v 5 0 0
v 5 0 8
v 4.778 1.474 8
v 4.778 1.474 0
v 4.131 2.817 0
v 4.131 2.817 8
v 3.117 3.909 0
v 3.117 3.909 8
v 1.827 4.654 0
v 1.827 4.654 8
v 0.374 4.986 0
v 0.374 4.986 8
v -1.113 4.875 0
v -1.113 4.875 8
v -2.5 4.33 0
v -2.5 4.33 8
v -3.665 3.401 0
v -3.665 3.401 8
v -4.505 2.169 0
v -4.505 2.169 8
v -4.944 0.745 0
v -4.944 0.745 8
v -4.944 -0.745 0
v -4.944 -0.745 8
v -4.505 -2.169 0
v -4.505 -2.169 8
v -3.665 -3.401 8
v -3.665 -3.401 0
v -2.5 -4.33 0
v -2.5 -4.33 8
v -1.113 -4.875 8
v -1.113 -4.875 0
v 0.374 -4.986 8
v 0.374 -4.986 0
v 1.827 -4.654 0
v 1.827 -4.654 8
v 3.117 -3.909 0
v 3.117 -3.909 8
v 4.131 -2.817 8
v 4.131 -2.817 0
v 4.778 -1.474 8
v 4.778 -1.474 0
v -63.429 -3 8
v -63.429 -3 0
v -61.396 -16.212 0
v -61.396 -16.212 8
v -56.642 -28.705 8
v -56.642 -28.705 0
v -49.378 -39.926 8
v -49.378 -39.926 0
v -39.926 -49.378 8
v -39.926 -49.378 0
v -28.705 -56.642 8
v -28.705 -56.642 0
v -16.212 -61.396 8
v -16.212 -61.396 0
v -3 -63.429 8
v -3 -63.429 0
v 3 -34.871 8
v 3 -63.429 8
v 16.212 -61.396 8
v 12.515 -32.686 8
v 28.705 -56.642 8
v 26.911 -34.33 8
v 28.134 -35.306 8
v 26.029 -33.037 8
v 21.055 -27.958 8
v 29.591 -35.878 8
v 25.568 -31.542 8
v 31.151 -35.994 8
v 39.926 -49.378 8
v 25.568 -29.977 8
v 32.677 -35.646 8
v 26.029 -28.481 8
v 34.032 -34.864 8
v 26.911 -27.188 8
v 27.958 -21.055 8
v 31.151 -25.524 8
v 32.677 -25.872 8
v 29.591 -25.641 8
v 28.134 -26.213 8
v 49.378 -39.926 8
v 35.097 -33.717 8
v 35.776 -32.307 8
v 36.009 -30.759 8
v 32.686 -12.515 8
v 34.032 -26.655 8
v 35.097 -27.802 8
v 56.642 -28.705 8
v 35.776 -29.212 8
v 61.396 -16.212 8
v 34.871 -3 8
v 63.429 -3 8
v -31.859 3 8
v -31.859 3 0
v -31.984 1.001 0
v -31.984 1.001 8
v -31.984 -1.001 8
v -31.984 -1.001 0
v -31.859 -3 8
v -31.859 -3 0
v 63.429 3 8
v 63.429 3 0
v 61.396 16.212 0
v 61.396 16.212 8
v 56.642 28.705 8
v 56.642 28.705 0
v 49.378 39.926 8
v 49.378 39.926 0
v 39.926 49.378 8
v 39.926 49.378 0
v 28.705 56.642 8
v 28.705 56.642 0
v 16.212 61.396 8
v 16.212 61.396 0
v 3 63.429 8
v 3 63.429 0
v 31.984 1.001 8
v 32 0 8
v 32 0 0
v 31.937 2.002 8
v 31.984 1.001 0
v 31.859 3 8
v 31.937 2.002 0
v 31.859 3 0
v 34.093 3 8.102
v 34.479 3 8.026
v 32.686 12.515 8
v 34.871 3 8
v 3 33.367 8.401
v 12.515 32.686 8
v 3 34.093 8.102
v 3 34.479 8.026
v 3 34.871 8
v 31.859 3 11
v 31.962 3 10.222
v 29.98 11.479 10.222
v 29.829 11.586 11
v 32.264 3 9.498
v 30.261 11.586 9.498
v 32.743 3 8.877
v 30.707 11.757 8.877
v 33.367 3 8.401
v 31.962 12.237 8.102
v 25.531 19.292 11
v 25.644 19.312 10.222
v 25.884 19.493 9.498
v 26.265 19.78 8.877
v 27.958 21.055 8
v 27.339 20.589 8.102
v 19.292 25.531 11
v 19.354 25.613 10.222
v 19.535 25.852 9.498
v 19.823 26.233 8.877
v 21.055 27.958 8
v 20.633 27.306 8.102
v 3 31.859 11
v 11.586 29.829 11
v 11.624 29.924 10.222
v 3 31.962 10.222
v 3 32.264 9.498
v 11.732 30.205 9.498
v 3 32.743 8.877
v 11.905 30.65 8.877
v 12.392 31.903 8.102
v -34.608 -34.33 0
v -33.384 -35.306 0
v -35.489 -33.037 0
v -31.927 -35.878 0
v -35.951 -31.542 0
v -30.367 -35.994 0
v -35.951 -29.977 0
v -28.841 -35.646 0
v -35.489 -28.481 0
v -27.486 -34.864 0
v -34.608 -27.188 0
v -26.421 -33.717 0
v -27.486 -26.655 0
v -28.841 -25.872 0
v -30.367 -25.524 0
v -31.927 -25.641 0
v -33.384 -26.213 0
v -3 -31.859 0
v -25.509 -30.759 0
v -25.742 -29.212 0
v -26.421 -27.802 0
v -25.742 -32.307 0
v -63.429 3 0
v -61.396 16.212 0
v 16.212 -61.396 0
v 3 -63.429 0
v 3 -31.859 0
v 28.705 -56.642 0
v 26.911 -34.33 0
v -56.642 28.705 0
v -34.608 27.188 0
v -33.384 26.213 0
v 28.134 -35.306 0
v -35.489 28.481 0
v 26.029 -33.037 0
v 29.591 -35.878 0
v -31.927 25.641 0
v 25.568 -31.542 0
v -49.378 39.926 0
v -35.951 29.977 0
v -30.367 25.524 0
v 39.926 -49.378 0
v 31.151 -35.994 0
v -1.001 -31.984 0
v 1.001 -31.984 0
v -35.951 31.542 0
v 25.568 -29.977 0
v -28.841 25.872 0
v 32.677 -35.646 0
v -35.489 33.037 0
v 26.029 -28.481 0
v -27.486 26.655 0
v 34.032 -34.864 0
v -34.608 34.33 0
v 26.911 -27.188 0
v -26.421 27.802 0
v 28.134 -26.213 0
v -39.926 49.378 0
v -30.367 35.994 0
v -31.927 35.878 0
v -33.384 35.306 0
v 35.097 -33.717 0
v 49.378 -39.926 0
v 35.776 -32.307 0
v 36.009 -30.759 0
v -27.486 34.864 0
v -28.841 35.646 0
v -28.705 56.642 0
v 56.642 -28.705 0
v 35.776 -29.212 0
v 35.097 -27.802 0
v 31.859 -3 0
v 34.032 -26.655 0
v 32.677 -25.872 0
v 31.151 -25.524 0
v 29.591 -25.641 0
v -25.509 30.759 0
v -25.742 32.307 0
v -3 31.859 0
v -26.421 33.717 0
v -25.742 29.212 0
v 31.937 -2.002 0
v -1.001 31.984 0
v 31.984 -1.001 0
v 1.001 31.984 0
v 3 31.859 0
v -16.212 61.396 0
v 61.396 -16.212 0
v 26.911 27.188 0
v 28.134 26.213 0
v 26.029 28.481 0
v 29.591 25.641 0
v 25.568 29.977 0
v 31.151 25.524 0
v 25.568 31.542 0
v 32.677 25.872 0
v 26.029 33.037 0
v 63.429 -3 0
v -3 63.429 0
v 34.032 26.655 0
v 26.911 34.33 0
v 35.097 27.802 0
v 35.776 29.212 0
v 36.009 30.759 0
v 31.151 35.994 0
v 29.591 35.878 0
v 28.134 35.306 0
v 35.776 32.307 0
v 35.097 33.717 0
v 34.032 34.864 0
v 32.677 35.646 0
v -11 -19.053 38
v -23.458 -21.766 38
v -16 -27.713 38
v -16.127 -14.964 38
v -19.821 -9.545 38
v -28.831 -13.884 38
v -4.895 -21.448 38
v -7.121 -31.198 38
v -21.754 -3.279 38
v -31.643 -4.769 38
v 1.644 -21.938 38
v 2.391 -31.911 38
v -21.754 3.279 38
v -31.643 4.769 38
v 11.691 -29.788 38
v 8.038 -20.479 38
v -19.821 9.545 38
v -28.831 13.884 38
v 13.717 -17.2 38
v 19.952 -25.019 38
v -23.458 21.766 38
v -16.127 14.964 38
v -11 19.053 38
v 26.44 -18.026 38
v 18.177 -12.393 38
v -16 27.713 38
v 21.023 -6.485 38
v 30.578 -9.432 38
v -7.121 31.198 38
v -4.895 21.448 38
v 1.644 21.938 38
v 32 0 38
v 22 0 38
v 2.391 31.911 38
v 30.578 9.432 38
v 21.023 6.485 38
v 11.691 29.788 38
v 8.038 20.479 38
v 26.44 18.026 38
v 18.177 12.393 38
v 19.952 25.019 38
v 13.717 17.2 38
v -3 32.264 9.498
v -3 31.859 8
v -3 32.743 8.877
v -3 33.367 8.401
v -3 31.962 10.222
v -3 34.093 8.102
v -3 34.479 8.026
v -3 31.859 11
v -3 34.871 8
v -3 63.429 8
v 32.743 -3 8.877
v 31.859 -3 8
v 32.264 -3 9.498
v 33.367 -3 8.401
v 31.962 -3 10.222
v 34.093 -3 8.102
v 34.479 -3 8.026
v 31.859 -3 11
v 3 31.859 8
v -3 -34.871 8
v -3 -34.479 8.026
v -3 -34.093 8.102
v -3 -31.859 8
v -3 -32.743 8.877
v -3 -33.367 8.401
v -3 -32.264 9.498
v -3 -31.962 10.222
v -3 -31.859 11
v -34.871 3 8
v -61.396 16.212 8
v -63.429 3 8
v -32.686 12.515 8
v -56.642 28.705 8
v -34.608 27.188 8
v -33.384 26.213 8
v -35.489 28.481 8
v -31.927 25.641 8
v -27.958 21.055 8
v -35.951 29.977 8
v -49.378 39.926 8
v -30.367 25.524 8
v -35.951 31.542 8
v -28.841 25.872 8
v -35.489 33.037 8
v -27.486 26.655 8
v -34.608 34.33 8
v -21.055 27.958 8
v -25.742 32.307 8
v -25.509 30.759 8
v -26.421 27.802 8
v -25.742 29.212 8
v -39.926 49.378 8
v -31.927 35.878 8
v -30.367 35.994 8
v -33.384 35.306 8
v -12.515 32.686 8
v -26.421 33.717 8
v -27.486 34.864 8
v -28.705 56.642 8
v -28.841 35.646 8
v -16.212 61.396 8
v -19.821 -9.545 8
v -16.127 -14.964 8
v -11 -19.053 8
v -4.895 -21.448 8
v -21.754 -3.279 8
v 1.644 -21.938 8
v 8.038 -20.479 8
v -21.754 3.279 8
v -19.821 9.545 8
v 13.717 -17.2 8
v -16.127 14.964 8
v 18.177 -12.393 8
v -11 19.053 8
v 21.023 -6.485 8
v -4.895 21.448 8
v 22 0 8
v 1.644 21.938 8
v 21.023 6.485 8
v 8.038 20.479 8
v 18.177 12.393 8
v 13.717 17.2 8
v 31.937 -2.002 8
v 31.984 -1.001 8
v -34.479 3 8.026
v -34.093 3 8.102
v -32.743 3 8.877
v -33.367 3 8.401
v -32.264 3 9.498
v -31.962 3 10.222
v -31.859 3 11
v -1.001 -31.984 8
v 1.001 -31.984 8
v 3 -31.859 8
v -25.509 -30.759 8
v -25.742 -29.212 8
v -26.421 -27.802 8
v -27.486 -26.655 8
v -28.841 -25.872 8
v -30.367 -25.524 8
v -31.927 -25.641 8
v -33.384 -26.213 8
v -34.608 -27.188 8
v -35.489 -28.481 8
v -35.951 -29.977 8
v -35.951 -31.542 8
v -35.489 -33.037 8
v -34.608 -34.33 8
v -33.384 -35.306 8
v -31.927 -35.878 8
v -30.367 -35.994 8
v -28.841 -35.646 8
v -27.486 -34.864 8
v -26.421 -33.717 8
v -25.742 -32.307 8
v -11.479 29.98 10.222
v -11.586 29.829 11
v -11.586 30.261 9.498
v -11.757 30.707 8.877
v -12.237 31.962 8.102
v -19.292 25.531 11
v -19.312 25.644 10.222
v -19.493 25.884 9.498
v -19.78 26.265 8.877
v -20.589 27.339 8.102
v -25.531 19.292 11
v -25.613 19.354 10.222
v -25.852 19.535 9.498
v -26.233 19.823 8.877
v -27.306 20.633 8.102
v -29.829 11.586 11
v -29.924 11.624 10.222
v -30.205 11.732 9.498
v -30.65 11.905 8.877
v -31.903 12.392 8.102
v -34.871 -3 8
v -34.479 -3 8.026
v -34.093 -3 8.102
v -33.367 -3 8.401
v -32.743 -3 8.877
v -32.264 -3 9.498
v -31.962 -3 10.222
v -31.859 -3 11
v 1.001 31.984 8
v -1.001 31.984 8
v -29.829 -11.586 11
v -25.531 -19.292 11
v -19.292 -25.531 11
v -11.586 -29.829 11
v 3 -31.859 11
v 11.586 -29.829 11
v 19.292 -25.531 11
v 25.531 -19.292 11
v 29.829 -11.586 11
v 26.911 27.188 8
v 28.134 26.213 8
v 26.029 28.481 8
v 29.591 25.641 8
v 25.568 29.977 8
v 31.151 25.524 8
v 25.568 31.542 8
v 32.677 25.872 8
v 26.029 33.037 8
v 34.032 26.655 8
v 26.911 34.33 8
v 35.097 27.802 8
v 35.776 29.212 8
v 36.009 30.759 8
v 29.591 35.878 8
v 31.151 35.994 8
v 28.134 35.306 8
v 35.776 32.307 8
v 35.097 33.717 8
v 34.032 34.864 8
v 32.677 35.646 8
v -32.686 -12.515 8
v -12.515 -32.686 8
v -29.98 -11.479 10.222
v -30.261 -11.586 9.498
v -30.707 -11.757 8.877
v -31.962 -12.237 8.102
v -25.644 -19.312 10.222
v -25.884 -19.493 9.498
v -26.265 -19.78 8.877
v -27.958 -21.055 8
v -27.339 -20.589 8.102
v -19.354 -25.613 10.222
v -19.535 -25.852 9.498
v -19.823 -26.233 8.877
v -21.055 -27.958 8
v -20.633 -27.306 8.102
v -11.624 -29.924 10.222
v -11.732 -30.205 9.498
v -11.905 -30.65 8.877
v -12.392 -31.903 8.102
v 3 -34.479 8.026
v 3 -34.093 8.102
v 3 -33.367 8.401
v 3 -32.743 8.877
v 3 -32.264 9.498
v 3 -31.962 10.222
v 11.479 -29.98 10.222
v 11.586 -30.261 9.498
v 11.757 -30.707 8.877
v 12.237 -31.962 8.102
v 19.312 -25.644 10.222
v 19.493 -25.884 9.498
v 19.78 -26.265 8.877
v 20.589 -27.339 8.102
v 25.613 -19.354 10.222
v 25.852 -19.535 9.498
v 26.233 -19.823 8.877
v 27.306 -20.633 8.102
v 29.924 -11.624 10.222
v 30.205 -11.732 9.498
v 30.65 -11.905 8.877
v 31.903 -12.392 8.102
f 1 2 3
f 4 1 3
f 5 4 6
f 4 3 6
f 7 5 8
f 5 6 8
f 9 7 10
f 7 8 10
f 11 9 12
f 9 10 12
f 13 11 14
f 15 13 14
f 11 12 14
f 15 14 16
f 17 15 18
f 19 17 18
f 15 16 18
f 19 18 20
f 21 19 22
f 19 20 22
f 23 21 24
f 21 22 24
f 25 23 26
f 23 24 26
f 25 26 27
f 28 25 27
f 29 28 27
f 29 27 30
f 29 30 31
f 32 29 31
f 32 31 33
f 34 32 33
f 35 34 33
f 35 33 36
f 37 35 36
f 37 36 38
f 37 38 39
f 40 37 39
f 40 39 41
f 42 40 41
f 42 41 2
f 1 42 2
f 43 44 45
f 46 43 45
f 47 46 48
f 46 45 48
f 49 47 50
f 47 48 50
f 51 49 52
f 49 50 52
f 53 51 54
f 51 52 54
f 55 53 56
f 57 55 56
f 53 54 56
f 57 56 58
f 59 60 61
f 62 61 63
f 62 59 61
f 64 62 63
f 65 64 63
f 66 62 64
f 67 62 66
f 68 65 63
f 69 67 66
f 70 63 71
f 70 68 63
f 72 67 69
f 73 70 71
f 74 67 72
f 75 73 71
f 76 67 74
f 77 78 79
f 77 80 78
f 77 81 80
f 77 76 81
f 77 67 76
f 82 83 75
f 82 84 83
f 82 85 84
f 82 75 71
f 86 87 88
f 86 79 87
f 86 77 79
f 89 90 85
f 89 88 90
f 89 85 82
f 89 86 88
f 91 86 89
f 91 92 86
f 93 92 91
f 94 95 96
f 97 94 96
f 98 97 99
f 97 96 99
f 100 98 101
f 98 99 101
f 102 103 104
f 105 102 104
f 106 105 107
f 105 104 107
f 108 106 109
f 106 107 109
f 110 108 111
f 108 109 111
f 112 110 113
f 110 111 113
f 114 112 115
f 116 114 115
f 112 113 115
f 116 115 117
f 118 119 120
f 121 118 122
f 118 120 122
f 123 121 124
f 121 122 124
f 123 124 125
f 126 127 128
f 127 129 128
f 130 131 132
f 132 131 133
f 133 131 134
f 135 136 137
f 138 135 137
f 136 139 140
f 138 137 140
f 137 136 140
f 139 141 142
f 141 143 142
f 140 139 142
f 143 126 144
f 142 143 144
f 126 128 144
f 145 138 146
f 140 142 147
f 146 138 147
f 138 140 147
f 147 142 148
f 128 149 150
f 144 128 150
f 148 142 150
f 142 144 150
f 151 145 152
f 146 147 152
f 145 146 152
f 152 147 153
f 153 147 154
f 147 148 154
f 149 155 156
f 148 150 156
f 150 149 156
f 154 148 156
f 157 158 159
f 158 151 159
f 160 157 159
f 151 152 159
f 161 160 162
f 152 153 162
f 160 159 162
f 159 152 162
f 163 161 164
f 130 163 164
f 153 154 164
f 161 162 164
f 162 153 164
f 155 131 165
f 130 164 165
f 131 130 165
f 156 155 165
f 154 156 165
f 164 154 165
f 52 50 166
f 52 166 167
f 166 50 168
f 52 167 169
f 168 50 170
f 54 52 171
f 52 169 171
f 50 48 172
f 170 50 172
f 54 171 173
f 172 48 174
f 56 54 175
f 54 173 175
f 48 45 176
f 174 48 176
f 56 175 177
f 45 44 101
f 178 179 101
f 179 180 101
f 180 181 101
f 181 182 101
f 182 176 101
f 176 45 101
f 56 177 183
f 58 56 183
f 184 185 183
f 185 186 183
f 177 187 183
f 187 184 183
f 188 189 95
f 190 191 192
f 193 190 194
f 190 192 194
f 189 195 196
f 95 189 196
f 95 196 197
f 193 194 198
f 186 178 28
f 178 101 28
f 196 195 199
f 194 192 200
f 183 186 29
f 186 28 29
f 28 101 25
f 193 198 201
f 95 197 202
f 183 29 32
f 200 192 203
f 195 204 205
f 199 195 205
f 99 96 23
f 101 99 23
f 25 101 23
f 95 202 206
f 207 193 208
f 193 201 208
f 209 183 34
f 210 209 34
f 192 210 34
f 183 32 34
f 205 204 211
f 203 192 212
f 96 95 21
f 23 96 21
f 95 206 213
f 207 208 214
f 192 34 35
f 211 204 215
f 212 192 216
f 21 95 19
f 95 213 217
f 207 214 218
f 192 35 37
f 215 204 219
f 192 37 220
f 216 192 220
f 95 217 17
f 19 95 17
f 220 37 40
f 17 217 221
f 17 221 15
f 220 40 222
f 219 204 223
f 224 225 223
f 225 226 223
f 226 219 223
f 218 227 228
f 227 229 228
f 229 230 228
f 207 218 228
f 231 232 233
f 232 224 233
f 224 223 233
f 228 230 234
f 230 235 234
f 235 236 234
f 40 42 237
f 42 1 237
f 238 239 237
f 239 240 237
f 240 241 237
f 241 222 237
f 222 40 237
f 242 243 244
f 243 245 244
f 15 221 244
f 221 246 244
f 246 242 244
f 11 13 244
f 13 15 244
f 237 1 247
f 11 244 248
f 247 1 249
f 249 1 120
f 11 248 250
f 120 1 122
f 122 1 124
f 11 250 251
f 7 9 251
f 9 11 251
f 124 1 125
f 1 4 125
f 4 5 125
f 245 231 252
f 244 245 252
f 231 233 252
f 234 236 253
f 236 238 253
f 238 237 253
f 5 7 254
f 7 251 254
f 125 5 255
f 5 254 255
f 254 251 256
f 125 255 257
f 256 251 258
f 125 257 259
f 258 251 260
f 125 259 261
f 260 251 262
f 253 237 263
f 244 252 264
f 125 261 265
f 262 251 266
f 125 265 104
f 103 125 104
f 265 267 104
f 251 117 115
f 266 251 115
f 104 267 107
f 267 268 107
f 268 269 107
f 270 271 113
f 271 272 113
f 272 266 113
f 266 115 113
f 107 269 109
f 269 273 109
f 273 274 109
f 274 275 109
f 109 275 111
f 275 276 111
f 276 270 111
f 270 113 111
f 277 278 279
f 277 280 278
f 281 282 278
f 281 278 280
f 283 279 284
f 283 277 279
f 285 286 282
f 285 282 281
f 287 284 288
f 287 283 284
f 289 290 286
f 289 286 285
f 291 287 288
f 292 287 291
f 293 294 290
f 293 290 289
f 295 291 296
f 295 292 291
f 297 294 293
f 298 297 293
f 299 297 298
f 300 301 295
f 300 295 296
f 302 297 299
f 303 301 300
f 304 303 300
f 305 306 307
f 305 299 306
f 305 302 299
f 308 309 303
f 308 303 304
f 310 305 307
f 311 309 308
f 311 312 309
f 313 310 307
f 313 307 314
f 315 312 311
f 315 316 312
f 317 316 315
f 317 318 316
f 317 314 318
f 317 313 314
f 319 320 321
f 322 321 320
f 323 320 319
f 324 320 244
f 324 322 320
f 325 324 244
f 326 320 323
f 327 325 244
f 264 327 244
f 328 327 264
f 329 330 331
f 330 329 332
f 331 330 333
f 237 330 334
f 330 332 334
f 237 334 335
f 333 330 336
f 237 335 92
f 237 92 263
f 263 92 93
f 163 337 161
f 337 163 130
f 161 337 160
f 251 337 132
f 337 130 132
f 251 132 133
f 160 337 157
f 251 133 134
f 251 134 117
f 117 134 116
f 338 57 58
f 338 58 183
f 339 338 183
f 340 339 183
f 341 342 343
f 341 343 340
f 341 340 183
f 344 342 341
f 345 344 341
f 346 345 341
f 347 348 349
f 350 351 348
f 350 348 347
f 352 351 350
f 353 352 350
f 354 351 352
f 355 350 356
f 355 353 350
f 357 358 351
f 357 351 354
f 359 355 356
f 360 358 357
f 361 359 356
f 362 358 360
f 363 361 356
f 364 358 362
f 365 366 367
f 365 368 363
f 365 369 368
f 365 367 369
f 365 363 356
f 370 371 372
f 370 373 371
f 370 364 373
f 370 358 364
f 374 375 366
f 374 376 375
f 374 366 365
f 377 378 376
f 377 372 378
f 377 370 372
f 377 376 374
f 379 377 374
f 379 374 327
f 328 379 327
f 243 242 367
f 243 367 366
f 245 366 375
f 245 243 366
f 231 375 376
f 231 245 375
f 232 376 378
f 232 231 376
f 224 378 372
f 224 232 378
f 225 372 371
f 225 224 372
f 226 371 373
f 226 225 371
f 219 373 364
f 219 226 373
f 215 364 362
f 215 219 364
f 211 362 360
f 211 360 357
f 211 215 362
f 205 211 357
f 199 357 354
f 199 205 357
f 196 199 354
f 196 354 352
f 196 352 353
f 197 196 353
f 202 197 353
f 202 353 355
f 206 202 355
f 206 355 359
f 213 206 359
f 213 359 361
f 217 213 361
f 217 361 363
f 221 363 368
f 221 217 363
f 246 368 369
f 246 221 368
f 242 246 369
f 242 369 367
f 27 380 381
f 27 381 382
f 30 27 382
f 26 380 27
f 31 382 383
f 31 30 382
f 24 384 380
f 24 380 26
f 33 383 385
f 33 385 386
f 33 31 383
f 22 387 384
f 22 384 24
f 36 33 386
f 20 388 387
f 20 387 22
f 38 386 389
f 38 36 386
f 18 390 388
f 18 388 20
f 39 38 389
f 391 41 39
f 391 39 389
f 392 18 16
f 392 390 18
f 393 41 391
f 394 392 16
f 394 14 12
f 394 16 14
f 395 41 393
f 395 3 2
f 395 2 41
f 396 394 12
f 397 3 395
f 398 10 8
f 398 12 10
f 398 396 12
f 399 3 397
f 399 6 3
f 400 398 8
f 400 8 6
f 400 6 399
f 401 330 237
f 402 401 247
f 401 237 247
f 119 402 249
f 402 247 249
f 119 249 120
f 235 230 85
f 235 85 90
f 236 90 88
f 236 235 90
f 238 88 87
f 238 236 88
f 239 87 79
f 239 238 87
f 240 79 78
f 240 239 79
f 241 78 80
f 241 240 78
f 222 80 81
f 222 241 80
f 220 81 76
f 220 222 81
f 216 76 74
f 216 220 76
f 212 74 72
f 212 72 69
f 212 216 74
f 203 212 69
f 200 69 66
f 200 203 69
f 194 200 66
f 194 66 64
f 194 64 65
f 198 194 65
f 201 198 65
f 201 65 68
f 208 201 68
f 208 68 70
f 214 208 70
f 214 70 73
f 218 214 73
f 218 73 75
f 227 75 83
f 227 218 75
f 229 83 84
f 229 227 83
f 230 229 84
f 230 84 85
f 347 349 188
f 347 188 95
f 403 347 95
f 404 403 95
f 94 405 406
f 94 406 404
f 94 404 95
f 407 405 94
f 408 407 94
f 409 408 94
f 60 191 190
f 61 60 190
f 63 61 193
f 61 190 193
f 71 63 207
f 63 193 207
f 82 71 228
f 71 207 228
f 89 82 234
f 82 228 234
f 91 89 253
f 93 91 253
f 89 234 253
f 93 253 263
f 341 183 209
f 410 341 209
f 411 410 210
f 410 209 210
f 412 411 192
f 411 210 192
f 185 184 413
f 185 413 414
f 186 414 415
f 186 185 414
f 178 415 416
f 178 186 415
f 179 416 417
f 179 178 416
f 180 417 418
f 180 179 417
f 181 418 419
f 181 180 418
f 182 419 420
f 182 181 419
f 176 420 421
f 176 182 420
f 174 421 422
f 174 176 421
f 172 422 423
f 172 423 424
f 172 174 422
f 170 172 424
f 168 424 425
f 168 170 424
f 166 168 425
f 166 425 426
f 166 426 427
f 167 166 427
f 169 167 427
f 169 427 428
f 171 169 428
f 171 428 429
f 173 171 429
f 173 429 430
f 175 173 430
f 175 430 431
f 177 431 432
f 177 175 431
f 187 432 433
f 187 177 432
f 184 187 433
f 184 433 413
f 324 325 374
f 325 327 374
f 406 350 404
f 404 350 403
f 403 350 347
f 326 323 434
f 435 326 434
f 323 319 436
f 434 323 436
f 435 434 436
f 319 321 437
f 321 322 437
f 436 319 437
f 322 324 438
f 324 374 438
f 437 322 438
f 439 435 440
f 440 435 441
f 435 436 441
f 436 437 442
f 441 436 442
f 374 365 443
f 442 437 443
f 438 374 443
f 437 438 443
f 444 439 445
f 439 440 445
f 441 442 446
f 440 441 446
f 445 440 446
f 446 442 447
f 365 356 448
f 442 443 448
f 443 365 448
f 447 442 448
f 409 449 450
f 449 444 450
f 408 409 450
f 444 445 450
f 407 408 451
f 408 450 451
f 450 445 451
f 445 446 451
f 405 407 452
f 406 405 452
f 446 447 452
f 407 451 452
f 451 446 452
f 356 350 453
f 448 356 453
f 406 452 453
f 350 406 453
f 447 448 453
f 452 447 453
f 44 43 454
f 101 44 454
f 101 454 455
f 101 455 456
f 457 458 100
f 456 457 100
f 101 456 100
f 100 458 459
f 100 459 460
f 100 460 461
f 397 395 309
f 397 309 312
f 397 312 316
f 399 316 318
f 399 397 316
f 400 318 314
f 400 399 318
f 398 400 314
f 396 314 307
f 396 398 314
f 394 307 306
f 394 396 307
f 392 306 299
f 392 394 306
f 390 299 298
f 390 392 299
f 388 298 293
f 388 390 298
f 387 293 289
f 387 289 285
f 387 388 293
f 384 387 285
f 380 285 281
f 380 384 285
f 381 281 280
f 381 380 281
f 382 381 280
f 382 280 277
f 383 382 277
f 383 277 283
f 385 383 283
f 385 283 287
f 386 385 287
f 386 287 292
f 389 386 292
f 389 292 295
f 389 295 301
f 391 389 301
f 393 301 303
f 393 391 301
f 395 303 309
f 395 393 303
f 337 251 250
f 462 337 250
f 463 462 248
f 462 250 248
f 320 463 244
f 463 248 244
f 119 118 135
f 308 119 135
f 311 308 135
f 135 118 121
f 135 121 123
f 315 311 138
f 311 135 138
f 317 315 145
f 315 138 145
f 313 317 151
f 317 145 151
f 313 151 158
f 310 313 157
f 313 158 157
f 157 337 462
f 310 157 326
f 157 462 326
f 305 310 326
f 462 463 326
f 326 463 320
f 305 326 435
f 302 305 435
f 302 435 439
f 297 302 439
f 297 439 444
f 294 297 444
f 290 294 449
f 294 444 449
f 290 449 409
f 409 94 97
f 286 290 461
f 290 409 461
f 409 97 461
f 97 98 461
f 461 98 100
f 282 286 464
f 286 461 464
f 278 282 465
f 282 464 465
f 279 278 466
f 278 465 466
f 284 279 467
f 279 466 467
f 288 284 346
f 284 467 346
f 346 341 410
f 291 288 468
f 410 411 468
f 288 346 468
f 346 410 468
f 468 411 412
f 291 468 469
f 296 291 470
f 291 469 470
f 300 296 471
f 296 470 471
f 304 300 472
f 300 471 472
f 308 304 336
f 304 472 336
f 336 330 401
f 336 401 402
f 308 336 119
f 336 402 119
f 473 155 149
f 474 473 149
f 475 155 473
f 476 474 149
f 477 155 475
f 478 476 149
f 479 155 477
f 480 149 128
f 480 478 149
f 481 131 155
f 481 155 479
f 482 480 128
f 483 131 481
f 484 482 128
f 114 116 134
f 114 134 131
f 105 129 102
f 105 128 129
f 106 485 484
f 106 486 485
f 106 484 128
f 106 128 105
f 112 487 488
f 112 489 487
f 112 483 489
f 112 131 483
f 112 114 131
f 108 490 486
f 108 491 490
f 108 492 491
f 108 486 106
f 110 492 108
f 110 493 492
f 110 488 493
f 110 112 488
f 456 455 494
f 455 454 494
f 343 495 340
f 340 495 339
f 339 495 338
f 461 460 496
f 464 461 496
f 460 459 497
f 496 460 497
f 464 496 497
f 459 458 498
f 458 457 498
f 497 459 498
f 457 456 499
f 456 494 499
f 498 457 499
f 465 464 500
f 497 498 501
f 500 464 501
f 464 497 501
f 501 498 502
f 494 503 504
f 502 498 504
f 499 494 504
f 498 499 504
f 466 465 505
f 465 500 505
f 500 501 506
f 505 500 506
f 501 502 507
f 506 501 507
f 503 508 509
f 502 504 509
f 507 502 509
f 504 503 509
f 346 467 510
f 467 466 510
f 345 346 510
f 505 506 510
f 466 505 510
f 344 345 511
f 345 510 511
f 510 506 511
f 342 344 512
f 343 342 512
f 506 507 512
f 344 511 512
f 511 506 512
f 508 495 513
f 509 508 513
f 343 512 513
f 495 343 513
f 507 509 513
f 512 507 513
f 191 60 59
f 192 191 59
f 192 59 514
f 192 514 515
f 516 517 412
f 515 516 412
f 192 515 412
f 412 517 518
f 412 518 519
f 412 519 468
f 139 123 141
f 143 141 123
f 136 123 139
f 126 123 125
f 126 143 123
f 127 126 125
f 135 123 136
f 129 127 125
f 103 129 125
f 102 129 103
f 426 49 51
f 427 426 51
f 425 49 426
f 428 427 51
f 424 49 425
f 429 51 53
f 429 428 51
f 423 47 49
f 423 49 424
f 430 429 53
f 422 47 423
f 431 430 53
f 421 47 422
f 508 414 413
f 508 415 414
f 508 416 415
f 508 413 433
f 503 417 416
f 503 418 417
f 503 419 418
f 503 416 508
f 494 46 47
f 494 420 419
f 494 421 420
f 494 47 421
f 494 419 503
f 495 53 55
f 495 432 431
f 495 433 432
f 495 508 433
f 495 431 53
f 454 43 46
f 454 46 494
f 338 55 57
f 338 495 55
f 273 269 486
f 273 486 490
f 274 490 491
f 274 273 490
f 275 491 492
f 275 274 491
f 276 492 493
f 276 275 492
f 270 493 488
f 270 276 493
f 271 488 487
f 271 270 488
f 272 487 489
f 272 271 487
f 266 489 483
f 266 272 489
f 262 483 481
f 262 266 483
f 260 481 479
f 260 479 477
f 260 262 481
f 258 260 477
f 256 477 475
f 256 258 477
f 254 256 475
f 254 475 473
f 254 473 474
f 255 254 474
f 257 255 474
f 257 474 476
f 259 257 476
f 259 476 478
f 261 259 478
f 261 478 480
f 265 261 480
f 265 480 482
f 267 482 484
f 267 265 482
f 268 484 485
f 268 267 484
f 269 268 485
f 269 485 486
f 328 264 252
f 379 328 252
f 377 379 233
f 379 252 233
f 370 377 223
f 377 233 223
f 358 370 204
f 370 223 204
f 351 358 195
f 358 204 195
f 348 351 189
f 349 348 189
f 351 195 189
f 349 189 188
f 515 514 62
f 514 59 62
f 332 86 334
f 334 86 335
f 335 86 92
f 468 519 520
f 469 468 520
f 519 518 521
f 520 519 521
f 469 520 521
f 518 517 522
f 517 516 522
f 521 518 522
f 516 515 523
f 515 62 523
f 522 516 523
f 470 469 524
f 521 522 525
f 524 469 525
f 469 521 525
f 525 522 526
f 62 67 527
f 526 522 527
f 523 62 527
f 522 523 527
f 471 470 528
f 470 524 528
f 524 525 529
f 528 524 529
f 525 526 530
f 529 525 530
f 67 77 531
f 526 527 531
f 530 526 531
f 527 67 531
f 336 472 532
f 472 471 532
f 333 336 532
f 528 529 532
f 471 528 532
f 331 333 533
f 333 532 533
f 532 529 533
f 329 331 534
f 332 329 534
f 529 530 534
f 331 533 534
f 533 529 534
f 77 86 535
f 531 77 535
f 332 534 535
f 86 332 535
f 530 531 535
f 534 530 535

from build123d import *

# Parameters (mm, degrees)
F0_R         = 5.25
F1_DEPTH     = 8
F2_R         = 32
F2_R_2       = 22
F3_DEPTH     = 30
F4_T4_ANGLE  = 106.1070017135
F4_T9_ANGLE  = 106.1070017135
F4_T15_ANGLE = 106.1070017135
F4_T20_ANGLE = 106.1070017135
F4_T25_ANGLE = 106.1070017135
F4_T31_ANGLE = 106.1070017135
F4_T36_ANGLE = 106.1070017135
F4_T41_ANGLE = 106.1070017135
F4_T47_ANGLE = 106.1070017135
F4_T52_ANGLE = 106.1070017135
F4_T57_ANGLE = 106.1070017135
F4_T63_ANGLE = 106.1070017135
F5_R         = 5
F6_DEPTH     = 19.3


# Not quite as in the source:
# - a fillet or chamfer that OpenCascade refuses, or shapes differently, is made with other operations: its cross-section is extruded or revolved along the edge and cut away or added


with BuildPart() as f1:
    # F0 (on Top) → F1 (new body)
    with BuildSketch(Plane.XY):
        with BuildLine():
            ThreePointArc((3, 31.8590646441), (22.627416998, 22.627416998), (31.8590646441, 3))
            Line((31.8590646441, 3), (63.4290942707, 3))
            ThreePointArc((63.4290942707, 3), (44.9012806053, 44.9012806053), (3, 63.4290942707))
            Line((3, 63.4290942707), (3, 31.8590646441))
        make_face()
        with Locations((30.7591449816, 30.7591449816)):
            Circle(F0_R, mode=Mode.SUBTRACT)
        with BuildLine():
            ThreePointArc((-31.8590646441, 3), (-22.627416998, 22.627416998), (-3, 31.8590646441))
            Line((-3, 31.8590646441), (-3, 63.4290942707))
            ThreePointArc((-3, 63.4290942707), (-44.9012806053, 44.9012806053), (-63.4290942707, 3))
            Line((-63.4290942707, 3), (-31.8590646441, 3))
        make_face()
        with Locations((-30.7591449816, 30.7591449816)):
            Circle(F0_R, mode=Mode.SUBTRACT)
        with BuildLine():
            Line((-3, -63.4290942707), (-3, -31.8590646441))
            ThreePointArc((-3, -31.8590646441), (-22.627416998, -22.627416998), (-31.8590646441, -3))
            Line((-31.8590646441, -3), (-63.4290942707, -3))
            ThreePointArc((-63.4290942707, -3), (-44.9012806053, -44.9012806053), (-3, -63.4290942707))
        make_face()
        with Locations((-30.7591449816, -30.7591449816)):
            Circle(F0_R, mode=Mode.SUBTRACT)
        with BuildLine():
            Line((63.4290942707, -3), (31.8590646441, -3))
            ThreePointArc((31.8590646441, -3), (22.627416998, -22.627416998), (3, -31.8590646441))
            Line((3, -31.8590646441), (3, -63.4290942707))
            ThreePointArc((3, -63.4290942707), (44.9012806053, -44.9012806053), (63.4290942707, -3))
        make_face()
        with Locations((30.7591449816, -30.7591449816)):
            Circle(F0_R, mode=Mode.SUBTRACT)
        with BuildLine():
            ThreePointArc((31.8590646441, -3), (31.9647467424, -1.501654319), (32, 0))
            ThreePointArc((32, 0), (31.9647467424, 1.501654319), (31.8590646441, 3))
            ThreePointArc((31.8590646441, 3), (22.627416998, 22.627416998), (3, 31.8590646441))
            ThreePointArc((3, 31.8590646441), (0, 32), (-3, 31.8590646441))
            ThreePointArc((-3, 31.8590646441), (-22.627416998, 22.627416998), (-31.8590646441, 3))
            ThreePointArc((-31.8590646441, 3), (-32, 0), (-31.8590646441, -3))
            ThreePointArc((-31.8590646441, -3), (-22.627416998, -22.627416998), (-3, -31.8590646441))
            ThreePointArc((-3, -31.8590646441), (0, -32), (3, -31.8590646441))
            ThreePointArc((3, -31.8590646441), (22.627416998, -22.627416998), (31.8590646441, -3))
        make_face()
    extrude(amount=F1_DEPTH)

    # F2 (on face) → F3 (join)
    with BuildSketch(Plane.XY.offset(8)):
        Circle(F2_R)
        Circle(F2_R_2, mode=Mode.SUBTRACT)
    extrude(amount=F3_DEPTH)

    # F4: fillet of radius 3 on 6 edges, made by hand


with BuildPart() as f4_tool2:
    # F4_s3 → F4_t4 (revolve)
    with BuildSketch(Plane(origin=(0, 0, 0), x_dir=(0, 0, 1), z_dir=(-0.1400977189, -0.9901376819, 0))):
        with BuildLine():
            ThreePointArc((11, -32), (8.8786796564, -32.8786796564), (8, -35))
            Line((8, -35), (8, -32))
            Line((8, -32), (11, -32))
        make_face()
    revolve(axis=Axis((0, 0, 8), (0, 0, 1)), revolution_arc=F4_T4_ANGLE)

    split(bisect_by=Plane.XZ.offset(3), keep=Keep.TOP)


with BuildPart() as f1_1:
    add(f1.part)

    # F4_t1: union F4_tool2
    add(f4_tool2.part)


with BuildPart() as f4_tool7:
    # F4_s8 → F4_t9 (revolve)
    with BuildSketch(Plane(origin=(0, 0, 0), x_dir=(0, 0, 1), z_dir=(-0.1400977189, -0.9901376819, 0))):
        with BuildLine():
            ThreePointArc((11, -32), (8.8786796564, -32.8786796564), (8, -35))
            Line((8, -35), (8, -32))
            Line((8, -32), (11, -32))
        make_face()
    revolve(axis=Axis((0, 0, 8), (0, 0, 1)), revolution_arc=F4_T9_ANGLE)

    split(bisect_by=Plane.YZ.offset(3), keep=Keep.TOP)

    split(bisect_by=Plane.XZ.offset(-3), keep=Keep.BOTTOM)


with BuildPart() as f1_2:
    add(f1_1.part)

    # F4_t6: union F4_tool7
    add(f4_tool7.part)


with BuildPart() as f4_tool13:
    # F4_s14 → F4_t15 (revolve)
    with BuildSketch(Plane(origin=(0, 0, 0), x_dir=(0, 0, 1), z_dir=(-0.1400977189, -0.9901376819, 0))):
        with BuildLine():
            ThreePointArc((11, -32), (8.8786796564, -32.8786796564), (8, -35))
            Line((8, -35), (8, -32))
            Line((8, -32), (11, -32))
        make_face()
    revolve(axis=Axis((0, 0, 8), (0, 0, 1)), revolution_arc=F4_T15_ANGLE)

    split(bisect_by=Plane.YZ.offset(-3), keep=Keep.BOTTOM)


with BuildPart() as f1_3:
    add(f1_2.part)

    # F4_t12: union F4_tool13
    add(f4_tool13.part)


with BuildPart() as f4_tool18:
    # F4_s19 → F4_t20 (revolve)
    with BuildSketch(Plane(origin=(0, 0, 0), x_dir=(0, 0, 1), z_dir=(-0.9901376819, 0.1400977189, 0))):
        with BuildLine():
            ThreePointArc((11, -32), (8.8786796564, -32.8786796564), (8, -35))
            Line((8, -35), (8, -32))
            Line((8, -32), (11, -32))
        make_face()
    revolve(axis=Axis((0, 0, 8), (0, 0, 1)), revolution_arc=F4_T20_ANGLE)

    split(bisect_by=Plane.YZ.offset(-3), keep=Keep.BOTTOM)


with BuildPart() as f1_4:
    add(f1_3.part)

    # F4_t17: union F4_tool18
    add(f4_tool18.part)


with BuildPart() as f4_tool23:
    # F4_s24 → F4_t25 (revolve)
    with BuildSketch(Plane(origin=(0, 0, 0), x_dir=(0, 0, 1), z_dir=(-0.9901376819, 0.1400977189, 0))):
        with BuildLine():
            ThreePointArc((11, -32), (8.8786796564, -32.8786796564), (8, -35))
            Line((8, -35), (8, -32))
            Line((8, -32), (11, -32))
        make_face()
    revolve(axis=Axis((0, 0, 8), (0, 0, 1)), revolution_arc=F4_T25_ANGLE)

    split(bisect_by=Plane.XZ.offset(3), keep=Keep.TOP)

    split(bisect_by=Plane.YZ.offset(3), keep=Keep.TOP)


with BuildPart() as f1_5:
    add(f1_4.part)

    # F4_t22: union F4_tool23
    add(f4_tool23.part)


with BuildPart() as f4_tool29:
    # F4_s30 → F4_t31 (revolve)
    with BuildSketch(Plane(origin=(0, 0, 0), x_dir=(0, 0, 1), z_dir=(-0.9901376819, 0.1400977189, 0))):
        with BuildLine():
            ThreePointArc((11, -32), (8.8786796564, -32.8786796564), (8, -35))
            Line((8, -35), (8, -32))
            Line((8, -32), (11, -32))
        make_face()
    revolve(axis=Axis((0, 0, 8), (0, 0, 1)), revolution_arc=F4_T31_ANGLE)

    split(bisect_by=Plane.XZ.offset(-3), keep=Keep.BOTTOM)


with BuildPart() as f1_6:
    add(f1_5.part)

    # F4_t28: union F4_tool29
    add(f4_tool29.part)


with BuildPart() as f4_tool34:
    # F4_s35 → F4_t36 (revolve)
    with BuildSketch(Plane(origin=(0, 0, 0), x_dir=(0, 0, 1), z_dir=(0.1400977189, 0.9901376819, 0))):
        with BuildLine():
            ThreePointArc((11, -32), (8.8786796564, -32.8786796564), (8, -35))
            Line((8, -35), (8, -32))
            Line((8, -32), (11, -32))
        make_face()
    revolve(axis=Axis((0, 0, 8), (0, 0, 1)), revolution_arc=F4_T36_ANGLE)

    split(bisect_by=Plane.XZ.offset(-3), keep=Keep.BOTTOM)


with BuildPart() as f1_7:
    add(f1_6.part)

    # F4_t33: union F4_tool34
    add(f4_tool34.part)


with BuildPart() as f4_tool39:
    # F4_s40 → F4_t41 (revolve)
    with BuildSketch(Plane(origin=(0, 0, 0), x_dir=(0, 0, 1), z_dir=(0.1400977189, 0.9901376819, 0))):
        with BuildLine():
            ThreePointArc((11, -32), (8.8786796564, -32.8786796564), (8, -35))
            Line((8, -35), (8, -32))
            Line((8, -32), (11, -32))
        make_face()
    revolve(axis=Axis((0, 0, 8), (0, 0, 1)), revolution_arc=F4_T41_ANGLE)

    split(bisect_by=Plane.XZ.offset(3), keep=Keep.TOP)

    split(bisect_by=Plane.YZ.offset(-3), keep=Keep.BOTTOM)


with BuildPart() as f1_8:
    add(f1_7.part)

    # F4_t38: union F4_tool39
    add(f4_tool39.part)


with BuildPart() as f4_tool45:
    # F4_s46 → F4_t47 (revolve)
    with BuildSketch(Plane(origin=(0, 0, 0), x_dir=(0, 0, 1), z_dir=(0.1400977189, 0.9901376819, 0))):
        with BuildLine():
            ThreePointArc((11, -32), (8.8786796564, -32.8786796564), (8, -35))
            Line((8, -35), (8, -32))
            Line((8, -32), (11, -32))
        make_face()
    revolve(axis=Axis((0, 0, 8), (0, 0, 1)), revolution_arc=F4_T47_ANGLE)

    split(bisect_by=Plane.YZ.offset(3), keep=Keep.TOP)


with BuildPart() as f1_9:
    add(f1_8.part)

    # F4_t44: union F4_tool45
    add(f4_tool45.part)


with BuildPart() as f4_tool50:
    # F4_s51 → F4_t52 (revolve)
    with BuildSketch(Plane(origin=(0, 0, 0), x_dir=(0, 0, 1), z_dir=(0.9901376819, -0.1400977189, 0))):
        with BuildLine():
            ThreePointArc((11, -32), (8.8786796564, -32.8786796564), (8, -35))
            Line((8, -35), (8, -32))
            Line((8, -32), (11, -32))
        make_face()
    revolve(axis=Axis((0, 0, 8), (0, 0, 1)), revolution_arc=F4_T52_ANGLE)

    split(bisect_by=Plane.YZ.offset(3), keep=Keep.TOP)


with BuildPart() as f1_10:
    add(f1_9.part)

    # F4_t49: union F4_tool50
    add(f4_tool50.part)


with BuildPart() as f4_tool55:
    # F4_s56 → F4_t57 (revolve)
    with BuildSketch(Plane(origin=(0, 0, 0), x_dir=(0, 0, 1), z_dir=(0.9901376819, -0.1400977189, 0))):
        with BuildLine():
            ThreePointArc((11, -32), (8.8786796564, -32.8786796564), (8, -35))
            Line((8, -35), (8, -32))
            Line((8, -32), (11, -32))
        make_face()
    revolve(axis=Axis((0, 0, 8), (0, 0, 1)), revolution_arc=F4_T57_ANGLE)

    split(bisect_by=Plane.XZ.offset(-3), keep=Keep.BOTTOM)

    split(bisect_by=Plane.YZ.offset(-3), keep=Keep.BOTTOM)


with BuildPart() as f1_11:
    add(f1_10.part)

    # F4_t54: union F4_tool55
    add(f4_tool55.part)


with BuildPart() as f4_tool61:
    # F4_s62 → F4_t63 (revolve)
    with BuildSketch(Plane(origin=(0, 0, 0), x_dir=(0, 0, 1), z_dir=(0.9901376819, -0.1400977189, 0))):
        with BuildLine():
            ThreePointArc((11, -32), (8.8786796564, -32.8786796564), (8, -35))
            Line((8, -35), (8, -32))
            Line((8, -32), (11, -32))
        make_face()
    revolve(axis=Axis((0, 0, 8), (0, 0, 1)), revolution_arc=F4_T63_ANGLE)

    split(bisect_by=Plane.XZ.offset(3), keep=Keep.TOP)


with BuildPart() as f1_12:
    add(f1_11.part)

    # F4_t60: union F4_tool61
    add(f4_tool61.part)

    # F5 (on face) → F6 (cut)
    with BuildSketch(Plane.XY.offset(8)):
        Circle(F5_R)
    extrude(amount=-F6_DEPTH, mode=Mode.SUBTRACT)


solid = f1_12.part
